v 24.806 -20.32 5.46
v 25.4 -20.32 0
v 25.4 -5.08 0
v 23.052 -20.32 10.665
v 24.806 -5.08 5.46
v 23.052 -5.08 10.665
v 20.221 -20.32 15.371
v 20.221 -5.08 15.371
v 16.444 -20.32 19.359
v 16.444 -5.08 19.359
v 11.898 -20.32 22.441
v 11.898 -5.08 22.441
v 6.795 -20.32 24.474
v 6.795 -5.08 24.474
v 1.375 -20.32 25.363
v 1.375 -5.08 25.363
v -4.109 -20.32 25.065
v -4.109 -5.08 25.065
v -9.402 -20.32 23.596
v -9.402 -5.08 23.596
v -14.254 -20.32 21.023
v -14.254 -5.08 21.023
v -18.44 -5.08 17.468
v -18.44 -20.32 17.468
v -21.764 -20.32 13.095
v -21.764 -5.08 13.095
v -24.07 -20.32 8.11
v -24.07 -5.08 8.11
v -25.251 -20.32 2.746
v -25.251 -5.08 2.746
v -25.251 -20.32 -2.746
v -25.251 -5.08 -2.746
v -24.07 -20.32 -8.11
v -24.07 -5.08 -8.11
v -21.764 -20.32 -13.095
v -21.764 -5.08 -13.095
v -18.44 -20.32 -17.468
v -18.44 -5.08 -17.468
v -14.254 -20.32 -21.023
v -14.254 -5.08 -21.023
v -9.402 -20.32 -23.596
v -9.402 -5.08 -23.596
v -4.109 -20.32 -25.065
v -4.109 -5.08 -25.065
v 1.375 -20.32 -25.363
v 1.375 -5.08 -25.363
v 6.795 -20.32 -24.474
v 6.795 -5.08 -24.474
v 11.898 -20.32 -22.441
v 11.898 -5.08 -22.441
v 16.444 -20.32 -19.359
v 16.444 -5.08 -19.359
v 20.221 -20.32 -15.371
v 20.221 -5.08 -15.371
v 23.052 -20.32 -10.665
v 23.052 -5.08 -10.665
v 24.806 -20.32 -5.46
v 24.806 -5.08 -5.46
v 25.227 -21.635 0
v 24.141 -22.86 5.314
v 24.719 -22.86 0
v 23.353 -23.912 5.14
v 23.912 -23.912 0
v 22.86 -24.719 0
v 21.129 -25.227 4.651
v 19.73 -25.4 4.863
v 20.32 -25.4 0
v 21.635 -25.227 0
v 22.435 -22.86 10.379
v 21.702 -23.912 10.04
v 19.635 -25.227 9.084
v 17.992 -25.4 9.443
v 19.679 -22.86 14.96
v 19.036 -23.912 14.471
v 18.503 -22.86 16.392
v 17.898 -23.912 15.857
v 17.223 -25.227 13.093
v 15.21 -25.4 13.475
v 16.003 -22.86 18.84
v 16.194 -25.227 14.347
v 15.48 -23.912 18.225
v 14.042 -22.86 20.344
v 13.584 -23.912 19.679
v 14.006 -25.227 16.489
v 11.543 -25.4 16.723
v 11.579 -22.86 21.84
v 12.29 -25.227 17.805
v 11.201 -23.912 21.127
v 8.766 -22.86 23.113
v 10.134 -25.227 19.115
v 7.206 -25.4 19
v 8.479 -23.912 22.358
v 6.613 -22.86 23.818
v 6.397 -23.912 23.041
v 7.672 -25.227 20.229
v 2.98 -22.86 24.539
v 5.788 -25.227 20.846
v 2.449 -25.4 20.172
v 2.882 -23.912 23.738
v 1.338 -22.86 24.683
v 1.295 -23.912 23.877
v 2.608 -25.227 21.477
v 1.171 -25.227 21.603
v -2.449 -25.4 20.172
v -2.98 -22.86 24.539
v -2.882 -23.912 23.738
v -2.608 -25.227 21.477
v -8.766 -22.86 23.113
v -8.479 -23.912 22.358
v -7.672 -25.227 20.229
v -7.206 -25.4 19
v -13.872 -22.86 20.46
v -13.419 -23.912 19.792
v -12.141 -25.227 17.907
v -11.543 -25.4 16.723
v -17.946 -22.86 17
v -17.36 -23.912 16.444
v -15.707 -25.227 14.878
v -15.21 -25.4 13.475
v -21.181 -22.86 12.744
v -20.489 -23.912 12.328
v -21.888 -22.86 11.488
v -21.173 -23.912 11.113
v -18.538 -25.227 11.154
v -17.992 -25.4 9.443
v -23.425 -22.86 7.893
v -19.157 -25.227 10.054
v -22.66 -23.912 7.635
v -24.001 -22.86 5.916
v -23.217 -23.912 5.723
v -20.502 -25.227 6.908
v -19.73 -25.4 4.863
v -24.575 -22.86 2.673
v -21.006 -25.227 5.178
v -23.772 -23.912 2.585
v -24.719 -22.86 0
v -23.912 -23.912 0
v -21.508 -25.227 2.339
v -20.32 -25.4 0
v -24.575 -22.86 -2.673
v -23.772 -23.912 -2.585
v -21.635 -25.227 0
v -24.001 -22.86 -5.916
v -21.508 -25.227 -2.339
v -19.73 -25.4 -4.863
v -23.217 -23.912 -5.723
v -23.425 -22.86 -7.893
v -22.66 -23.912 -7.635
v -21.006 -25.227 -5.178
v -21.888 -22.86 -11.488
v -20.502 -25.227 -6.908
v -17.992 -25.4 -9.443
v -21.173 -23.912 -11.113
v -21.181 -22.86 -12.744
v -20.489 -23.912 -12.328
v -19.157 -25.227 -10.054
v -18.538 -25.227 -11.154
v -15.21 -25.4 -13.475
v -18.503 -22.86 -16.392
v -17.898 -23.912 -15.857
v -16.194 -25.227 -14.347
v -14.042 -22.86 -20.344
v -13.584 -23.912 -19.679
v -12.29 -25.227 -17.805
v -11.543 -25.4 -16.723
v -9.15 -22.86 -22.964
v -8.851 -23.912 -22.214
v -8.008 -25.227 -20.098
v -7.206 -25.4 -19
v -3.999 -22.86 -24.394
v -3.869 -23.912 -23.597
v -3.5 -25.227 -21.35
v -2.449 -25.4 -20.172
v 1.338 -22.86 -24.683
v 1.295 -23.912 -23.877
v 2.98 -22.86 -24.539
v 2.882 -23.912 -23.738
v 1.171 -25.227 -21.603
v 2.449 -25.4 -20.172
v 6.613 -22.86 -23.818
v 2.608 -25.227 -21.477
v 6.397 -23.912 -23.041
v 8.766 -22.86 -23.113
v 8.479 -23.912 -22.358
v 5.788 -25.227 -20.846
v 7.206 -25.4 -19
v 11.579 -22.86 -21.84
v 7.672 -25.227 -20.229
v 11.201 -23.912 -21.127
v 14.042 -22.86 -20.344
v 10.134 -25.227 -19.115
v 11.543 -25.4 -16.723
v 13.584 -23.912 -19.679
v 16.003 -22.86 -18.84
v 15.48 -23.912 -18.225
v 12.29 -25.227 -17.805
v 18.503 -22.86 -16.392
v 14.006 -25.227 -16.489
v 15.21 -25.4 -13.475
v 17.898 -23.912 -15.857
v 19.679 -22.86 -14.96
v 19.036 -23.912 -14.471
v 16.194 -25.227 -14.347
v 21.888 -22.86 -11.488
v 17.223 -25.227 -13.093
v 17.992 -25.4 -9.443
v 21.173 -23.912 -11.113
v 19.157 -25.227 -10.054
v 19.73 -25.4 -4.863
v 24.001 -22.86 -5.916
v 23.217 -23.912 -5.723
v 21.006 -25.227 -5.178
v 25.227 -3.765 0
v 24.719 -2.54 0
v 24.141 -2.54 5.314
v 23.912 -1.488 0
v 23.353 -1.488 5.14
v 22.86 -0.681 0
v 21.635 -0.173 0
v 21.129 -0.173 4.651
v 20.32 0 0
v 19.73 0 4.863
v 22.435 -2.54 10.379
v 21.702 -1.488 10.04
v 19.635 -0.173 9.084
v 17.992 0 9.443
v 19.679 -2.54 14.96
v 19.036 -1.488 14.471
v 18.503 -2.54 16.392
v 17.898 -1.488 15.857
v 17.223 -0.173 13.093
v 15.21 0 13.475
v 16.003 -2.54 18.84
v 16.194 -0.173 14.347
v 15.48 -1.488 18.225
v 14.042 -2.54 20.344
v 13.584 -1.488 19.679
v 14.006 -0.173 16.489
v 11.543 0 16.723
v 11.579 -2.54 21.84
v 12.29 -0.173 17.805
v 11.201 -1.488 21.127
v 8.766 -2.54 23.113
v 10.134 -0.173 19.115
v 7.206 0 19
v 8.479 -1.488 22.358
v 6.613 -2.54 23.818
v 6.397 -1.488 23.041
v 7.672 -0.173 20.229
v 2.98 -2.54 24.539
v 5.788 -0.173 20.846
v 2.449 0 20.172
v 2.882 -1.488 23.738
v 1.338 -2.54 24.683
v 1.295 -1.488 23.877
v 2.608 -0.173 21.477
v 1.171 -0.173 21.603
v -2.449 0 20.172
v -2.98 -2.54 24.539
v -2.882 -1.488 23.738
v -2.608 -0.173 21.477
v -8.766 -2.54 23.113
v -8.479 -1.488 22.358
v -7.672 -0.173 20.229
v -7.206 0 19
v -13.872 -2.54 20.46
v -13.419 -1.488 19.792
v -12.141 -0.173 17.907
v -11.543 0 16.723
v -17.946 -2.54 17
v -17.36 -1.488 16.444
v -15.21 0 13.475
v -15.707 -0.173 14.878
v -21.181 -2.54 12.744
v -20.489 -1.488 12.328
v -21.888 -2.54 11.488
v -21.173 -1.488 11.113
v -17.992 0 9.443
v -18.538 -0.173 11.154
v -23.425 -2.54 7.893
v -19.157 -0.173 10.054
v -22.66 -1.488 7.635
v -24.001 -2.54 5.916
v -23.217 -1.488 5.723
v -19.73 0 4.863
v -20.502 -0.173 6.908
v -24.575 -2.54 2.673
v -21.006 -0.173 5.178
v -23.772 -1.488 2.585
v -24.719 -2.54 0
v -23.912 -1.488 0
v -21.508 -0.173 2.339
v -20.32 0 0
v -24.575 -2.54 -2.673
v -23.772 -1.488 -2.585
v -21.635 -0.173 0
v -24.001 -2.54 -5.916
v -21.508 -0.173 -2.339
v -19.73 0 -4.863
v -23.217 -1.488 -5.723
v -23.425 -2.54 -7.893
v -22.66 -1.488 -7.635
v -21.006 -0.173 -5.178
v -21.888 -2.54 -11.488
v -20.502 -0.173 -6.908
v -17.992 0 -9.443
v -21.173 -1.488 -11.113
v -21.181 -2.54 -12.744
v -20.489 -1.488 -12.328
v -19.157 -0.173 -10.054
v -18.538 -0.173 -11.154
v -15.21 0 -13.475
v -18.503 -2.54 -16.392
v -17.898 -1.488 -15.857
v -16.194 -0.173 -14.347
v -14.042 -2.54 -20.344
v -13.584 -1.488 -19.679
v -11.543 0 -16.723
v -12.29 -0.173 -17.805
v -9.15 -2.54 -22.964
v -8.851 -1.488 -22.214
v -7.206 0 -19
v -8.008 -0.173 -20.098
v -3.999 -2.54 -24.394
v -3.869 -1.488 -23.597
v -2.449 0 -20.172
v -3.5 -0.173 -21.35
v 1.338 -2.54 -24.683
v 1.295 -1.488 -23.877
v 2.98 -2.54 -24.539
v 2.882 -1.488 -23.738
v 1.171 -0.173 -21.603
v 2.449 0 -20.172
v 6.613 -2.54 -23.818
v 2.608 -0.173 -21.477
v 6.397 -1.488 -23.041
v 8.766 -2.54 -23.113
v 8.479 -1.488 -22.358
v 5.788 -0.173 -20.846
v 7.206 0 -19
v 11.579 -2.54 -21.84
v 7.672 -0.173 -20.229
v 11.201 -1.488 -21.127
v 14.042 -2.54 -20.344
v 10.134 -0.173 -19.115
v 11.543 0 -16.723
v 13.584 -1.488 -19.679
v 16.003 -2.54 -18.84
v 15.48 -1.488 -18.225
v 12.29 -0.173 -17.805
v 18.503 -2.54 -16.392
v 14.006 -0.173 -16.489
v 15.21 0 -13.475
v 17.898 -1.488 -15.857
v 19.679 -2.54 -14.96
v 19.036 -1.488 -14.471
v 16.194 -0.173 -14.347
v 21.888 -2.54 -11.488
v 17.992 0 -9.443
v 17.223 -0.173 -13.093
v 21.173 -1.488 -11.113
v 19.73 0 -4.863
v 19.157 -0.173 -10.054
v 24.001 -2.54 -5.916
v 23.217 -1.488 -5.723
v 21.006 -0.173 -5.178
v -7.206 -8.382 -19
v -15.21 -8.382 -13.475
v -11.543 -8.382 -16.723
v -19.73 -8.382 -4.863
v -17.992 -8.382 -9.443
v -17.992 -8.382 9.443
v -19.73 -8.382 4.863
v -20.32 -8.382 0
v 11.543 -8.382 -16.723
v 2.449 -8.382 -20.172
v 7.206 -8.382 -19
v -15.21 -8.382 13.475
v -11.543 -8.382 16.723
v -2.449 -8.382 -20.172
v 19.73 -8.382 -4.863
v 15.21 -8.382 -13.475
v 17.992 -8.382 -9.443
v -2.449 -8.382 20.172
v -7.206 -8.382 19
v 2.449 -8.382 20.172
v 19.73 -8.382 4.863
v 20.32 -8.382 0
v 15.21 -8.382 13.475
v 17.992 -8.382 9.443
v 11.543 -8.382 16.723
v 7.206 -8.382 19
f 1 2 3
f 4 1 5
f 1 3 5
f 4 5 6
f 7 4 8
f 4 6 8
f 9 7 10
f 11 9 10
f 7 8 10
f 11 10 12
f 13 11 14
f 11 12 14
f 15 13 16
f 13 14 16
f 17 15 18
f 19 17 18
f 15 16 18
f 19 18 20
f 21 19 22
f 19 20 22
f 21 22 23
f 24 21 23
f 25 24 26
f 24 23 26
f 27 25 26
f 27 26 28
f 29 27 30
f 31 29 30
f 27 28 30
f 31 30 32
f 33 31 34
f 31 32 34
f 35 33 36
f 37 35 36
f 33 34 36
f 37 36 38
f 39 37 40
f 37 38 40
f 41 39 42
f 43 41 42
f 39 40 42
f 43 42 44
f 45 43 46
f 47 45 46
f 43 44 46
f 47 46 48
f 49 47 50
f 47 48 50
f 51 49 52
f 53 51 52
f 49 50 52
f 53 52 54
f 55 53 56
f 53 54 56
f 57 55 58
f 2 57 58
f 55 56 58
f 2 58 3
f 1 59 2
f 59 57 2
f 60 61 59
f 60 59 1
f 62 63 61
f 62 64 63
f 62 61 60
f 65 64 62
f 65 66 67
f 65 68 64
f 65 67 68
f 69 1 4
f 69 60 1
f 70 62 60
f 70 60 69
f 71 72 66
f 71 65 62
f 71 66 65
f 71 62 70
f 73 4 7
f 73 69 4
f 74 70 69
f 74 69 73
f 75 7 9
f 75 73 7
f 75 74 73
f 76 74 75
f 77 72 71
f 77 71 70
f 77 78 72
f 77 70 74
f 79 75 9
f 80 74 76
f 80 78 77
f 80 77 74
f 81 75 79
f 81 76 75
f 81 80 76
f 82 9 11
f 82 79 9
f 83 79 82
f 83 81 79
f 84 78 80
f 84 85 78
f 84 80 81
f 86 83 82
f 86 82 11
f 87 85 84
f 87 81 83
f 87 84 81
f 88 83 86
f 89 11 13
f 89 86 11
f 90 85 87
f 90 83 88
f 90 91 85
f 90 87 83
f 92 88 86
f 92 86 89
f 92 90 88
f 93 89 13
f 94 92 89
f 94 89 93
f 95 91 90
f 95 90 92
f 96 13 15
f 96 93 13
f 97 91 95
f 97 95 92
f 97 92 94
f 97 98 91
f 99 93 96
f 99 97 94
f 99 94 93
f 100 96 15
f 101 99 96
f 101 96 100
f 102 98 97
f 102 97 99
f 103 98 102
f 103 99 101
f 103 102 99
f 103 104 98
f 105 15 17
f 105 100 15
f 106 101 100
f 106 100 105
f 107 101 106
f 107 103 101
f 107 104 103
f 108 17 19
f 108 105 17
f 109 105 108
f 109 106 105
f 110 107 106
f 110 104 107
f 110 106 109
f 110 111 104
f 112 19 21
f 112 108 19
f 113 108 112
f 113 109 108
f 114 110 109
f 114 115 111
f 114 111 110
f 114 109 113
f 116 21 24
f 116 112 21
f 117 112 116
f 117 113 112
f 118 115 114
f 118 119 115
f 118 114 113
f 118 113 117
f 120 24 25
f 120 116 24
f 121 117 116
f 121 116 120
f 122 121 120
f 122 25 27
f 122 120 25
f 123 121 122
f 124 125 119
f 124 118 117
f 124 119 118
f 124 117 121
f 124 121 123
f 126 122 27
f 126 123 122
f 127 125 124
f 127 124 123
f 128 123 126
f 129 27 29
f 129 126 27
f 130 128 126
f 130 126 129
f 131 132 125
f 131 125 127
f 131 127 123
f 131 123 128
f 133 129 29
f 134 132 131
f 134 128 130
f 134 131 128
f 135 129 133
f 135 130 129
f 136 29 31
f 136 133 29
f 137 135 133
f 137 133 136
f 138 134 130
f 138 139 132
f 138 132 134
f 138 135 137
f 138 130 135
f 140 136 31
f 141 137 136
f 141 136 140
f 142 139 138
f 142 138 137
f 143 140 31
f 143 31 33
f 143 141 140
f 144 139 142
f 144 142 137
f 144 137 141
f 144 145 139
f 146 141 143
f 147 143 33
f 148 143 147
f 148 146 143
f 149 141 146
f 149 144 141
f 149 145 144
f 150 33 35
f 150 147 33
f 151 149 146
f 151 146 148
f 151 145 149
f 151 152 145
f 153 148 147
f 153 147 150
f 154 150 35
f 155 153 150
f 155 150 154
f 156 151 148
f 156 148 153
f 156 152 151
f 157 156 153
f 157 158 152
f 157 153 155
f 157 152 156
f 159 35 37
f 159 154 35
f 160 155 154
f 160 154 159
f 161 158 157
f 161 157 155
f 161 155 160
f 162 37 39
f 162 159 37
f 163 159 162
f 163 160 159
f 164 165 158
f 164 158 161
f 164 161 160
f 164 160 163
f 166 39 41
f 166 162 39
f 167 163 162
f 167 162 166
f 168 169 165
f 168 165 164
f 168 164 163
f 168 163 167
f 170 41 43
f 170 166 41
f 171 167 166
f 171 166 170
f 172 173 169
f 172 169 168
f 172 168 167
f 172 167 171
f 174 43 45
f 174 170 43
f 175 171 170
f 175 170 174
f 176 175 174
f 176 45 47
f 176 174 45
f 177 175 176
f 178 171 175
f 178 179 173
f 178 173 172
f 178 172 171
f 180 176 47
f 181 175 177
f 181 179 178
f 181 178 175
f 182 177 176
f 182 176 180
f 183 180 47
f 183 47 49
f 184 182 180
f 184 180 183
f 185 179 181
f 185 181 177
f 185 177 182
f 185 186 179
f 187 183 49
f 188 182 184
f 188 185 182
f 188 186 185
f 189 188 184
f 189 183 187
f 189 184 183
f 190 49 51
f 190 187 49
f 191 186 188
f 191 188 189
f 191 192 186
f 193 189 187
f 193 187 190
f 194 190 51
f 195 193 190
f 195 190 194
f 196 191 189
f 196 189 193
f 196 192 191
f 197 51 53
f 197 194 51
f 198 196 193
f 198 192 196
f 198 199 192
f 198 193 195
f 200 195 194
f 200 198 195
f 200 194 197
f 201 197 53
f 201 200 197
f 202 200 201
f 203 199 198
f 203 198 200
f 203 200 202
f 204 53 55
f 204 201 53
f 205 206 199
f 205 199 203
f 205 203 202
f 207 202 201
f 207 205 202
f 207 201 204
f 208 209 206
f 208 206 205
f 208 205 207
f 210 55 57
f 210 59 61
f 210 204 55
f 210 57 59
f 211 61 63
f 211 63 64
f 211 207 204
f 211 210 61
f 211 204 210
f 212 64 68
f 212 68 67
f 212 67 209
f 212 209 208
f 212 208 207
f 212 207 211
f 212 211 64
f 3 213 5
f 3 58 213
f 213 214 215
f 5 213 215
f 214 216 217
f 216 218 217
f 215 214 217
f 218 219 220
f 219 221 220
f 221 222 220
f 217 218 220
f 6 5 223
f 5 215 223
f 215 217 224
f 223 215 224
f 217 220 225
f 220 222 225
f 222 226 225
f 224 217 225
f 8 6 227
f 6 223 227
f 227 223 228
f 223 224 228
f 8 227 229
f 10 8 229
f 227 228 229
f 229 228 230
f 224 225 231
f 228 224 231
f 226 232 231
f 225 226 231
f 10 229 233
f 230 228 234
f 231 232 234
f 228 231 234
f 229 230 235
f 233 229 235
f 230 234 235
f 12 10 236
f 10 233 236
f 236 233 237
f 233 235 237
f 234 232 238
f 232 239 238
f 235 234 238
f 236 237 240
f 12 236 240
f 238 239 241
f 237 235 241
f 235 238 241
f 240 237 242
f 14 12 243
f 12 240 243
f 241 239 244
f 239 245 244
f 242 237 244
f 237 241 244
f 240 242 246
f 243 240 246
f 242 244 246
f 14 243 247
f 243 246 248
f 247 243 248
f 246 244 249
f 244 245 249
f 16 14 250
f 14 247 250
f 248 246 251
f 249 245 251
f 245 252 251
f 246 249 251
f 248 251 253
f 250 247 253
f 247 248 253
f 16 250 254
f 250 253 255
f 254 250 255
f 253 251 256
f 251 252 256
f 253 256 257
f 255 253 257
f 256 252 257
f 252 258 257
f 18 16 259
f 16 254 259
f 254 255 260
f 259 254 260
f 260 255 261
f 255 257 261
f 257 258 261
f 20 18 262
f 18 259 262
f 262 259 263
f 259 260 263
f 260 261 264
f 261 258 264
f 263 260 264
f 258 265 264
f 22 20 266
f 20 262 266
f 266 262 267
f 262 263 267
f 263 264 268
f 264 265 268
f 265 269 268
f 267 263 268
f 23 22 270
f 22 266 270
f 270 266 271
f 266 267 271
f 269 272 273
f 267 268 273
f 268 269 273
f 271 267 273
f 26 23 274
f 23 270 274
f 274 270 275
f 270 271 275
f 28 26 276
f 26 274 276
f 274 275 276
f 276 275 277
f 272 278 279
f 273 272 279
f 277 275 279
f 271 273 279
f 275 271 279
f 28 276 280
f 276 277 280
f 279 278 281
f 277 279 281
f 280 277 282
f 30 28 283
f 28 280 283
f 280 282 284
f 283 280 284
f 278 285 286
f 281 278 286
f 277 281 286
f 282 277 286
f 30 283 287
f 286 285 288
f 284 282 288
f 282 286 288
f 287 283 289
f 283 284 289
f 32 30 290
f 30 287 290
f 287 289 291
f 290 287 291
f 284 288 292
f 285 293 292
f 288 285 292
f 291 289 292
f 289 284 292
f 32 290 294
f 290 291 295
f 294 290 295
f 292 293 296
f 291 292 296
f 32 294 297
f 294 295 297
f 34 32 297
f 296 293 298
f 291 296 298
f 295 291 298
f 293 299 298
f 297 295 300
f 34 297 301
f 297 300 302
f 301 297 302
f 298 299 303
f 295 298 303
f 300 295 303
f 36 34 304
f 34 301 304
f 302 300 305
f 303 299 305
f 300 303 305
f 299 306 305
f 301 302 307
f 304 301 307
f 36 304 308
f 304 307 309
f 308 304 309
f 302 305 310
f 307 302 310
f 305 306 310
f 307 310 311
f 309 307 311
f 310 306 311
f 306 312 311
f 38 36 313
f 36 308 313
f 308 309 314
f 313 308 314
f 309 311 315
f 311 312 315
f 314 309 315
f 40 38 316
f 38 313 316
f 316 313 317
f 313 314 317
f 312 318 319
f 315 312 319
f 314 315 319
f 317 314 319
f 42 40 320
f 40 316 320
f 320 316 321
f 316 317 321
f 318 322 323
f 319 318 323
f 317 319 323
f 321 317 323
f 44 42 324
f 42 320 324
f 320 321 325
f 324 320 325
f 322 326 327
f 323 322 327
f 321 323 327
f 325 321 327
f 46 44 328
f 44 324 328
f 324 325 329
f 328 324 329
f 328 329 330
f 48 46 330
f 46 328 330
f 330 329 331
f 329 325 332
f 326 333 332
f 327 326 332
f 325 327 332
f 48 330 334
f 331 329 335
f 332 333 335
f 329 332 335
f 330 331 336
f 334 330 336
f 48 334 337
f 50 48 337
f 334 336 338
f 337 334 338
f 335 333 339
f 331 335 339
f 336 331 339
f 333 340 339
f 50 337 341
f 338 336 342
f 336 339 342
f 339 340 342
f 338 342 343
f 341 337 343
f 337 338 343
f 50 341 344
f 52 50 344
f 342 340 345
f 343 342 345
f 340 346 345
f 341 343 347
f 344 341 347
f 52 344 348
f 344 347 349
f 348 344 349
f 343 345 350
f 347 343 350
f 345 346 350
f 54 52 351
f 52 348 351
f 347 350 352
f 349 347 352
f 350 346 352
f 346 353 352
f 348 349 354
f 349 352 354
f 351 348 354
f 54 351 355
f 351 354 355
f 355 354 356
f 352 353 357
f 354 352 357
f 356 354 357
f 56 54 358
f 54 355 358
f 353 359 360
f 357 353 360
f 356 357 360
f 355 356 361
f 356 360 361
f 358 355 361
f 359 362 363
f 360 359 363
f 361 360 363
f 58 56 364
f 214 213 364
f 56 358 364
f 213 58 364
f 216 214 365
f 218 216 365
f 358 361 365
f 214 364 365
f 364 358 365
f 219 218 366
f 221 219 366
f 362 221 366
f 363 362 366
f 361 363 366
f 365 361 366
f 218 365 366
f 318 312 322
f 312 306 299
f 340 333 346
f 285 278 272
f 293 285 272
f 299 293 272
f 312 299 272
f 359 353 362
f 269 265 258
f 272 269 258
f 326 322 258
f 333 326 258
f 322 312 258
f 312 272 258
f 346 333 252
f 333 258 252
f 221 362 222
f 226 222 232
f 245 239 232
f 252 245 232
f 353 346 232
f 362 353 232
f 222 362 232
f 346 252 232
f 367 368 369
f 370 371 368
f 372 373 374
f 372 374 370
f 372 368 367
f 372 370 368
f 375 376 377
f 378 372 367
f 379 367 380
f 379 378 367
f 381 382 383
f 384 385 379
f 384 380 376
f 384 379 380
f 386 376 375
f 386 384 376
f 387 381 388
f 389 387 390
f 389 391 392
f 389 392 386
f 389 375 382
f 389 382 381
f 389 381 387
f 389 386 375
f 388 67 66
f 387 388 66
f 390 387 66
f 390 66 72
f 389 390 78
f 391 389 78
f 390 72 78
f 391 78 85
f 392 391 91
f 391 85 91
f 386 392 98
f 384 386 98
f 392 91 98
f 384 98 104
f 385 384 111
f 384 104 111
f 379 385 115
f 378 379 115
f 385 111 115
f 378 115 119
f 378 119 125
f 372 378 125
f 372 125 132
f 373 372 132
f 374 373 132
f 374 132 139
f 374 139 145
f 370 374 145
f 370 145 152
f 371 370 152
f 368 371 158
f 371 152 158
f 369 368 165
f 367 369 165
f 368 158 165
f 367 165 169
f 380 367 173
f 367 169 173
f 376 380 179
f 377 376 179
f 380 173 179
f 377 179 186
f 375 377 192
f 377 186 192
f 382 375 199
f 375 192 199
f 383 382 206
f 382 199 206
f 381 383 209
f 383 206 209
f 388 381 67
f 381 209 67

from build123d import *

# Parameters (mm, degrees)
F0_R      = 25.4
F1_DEPTH  = 25.4
F2_R      = 5.08
F1_FACE_R = 20.32
F3_DEPTH  = 17.018


with BuildPart() as f1:
    # F0 (on Front) → F1 (new body)
    with BuildSketch(Plane.XZ):
        Circle(F0_R)
    extrude(amount=F1_DEPTH)

    # F2
    f2_edges = [f1.edges().sort_by_distance(p)[0] for p in [
        (25.4, -12.7, 0),
        (-25.4, 0, 0),
        (-25.4, -25.4, 0),
    ]]
    fillet(f2_edges, radius=F2_R)

    # F1_face (on face) → F3 (cut)
    with BuildSketch(Plane.XZ.offset(25.4)):
        Circle(F1_FACE_R)
    extrude(amount=-F3_DEPTH, mode=Mode.SUBTRACT)


solid = f1.part
